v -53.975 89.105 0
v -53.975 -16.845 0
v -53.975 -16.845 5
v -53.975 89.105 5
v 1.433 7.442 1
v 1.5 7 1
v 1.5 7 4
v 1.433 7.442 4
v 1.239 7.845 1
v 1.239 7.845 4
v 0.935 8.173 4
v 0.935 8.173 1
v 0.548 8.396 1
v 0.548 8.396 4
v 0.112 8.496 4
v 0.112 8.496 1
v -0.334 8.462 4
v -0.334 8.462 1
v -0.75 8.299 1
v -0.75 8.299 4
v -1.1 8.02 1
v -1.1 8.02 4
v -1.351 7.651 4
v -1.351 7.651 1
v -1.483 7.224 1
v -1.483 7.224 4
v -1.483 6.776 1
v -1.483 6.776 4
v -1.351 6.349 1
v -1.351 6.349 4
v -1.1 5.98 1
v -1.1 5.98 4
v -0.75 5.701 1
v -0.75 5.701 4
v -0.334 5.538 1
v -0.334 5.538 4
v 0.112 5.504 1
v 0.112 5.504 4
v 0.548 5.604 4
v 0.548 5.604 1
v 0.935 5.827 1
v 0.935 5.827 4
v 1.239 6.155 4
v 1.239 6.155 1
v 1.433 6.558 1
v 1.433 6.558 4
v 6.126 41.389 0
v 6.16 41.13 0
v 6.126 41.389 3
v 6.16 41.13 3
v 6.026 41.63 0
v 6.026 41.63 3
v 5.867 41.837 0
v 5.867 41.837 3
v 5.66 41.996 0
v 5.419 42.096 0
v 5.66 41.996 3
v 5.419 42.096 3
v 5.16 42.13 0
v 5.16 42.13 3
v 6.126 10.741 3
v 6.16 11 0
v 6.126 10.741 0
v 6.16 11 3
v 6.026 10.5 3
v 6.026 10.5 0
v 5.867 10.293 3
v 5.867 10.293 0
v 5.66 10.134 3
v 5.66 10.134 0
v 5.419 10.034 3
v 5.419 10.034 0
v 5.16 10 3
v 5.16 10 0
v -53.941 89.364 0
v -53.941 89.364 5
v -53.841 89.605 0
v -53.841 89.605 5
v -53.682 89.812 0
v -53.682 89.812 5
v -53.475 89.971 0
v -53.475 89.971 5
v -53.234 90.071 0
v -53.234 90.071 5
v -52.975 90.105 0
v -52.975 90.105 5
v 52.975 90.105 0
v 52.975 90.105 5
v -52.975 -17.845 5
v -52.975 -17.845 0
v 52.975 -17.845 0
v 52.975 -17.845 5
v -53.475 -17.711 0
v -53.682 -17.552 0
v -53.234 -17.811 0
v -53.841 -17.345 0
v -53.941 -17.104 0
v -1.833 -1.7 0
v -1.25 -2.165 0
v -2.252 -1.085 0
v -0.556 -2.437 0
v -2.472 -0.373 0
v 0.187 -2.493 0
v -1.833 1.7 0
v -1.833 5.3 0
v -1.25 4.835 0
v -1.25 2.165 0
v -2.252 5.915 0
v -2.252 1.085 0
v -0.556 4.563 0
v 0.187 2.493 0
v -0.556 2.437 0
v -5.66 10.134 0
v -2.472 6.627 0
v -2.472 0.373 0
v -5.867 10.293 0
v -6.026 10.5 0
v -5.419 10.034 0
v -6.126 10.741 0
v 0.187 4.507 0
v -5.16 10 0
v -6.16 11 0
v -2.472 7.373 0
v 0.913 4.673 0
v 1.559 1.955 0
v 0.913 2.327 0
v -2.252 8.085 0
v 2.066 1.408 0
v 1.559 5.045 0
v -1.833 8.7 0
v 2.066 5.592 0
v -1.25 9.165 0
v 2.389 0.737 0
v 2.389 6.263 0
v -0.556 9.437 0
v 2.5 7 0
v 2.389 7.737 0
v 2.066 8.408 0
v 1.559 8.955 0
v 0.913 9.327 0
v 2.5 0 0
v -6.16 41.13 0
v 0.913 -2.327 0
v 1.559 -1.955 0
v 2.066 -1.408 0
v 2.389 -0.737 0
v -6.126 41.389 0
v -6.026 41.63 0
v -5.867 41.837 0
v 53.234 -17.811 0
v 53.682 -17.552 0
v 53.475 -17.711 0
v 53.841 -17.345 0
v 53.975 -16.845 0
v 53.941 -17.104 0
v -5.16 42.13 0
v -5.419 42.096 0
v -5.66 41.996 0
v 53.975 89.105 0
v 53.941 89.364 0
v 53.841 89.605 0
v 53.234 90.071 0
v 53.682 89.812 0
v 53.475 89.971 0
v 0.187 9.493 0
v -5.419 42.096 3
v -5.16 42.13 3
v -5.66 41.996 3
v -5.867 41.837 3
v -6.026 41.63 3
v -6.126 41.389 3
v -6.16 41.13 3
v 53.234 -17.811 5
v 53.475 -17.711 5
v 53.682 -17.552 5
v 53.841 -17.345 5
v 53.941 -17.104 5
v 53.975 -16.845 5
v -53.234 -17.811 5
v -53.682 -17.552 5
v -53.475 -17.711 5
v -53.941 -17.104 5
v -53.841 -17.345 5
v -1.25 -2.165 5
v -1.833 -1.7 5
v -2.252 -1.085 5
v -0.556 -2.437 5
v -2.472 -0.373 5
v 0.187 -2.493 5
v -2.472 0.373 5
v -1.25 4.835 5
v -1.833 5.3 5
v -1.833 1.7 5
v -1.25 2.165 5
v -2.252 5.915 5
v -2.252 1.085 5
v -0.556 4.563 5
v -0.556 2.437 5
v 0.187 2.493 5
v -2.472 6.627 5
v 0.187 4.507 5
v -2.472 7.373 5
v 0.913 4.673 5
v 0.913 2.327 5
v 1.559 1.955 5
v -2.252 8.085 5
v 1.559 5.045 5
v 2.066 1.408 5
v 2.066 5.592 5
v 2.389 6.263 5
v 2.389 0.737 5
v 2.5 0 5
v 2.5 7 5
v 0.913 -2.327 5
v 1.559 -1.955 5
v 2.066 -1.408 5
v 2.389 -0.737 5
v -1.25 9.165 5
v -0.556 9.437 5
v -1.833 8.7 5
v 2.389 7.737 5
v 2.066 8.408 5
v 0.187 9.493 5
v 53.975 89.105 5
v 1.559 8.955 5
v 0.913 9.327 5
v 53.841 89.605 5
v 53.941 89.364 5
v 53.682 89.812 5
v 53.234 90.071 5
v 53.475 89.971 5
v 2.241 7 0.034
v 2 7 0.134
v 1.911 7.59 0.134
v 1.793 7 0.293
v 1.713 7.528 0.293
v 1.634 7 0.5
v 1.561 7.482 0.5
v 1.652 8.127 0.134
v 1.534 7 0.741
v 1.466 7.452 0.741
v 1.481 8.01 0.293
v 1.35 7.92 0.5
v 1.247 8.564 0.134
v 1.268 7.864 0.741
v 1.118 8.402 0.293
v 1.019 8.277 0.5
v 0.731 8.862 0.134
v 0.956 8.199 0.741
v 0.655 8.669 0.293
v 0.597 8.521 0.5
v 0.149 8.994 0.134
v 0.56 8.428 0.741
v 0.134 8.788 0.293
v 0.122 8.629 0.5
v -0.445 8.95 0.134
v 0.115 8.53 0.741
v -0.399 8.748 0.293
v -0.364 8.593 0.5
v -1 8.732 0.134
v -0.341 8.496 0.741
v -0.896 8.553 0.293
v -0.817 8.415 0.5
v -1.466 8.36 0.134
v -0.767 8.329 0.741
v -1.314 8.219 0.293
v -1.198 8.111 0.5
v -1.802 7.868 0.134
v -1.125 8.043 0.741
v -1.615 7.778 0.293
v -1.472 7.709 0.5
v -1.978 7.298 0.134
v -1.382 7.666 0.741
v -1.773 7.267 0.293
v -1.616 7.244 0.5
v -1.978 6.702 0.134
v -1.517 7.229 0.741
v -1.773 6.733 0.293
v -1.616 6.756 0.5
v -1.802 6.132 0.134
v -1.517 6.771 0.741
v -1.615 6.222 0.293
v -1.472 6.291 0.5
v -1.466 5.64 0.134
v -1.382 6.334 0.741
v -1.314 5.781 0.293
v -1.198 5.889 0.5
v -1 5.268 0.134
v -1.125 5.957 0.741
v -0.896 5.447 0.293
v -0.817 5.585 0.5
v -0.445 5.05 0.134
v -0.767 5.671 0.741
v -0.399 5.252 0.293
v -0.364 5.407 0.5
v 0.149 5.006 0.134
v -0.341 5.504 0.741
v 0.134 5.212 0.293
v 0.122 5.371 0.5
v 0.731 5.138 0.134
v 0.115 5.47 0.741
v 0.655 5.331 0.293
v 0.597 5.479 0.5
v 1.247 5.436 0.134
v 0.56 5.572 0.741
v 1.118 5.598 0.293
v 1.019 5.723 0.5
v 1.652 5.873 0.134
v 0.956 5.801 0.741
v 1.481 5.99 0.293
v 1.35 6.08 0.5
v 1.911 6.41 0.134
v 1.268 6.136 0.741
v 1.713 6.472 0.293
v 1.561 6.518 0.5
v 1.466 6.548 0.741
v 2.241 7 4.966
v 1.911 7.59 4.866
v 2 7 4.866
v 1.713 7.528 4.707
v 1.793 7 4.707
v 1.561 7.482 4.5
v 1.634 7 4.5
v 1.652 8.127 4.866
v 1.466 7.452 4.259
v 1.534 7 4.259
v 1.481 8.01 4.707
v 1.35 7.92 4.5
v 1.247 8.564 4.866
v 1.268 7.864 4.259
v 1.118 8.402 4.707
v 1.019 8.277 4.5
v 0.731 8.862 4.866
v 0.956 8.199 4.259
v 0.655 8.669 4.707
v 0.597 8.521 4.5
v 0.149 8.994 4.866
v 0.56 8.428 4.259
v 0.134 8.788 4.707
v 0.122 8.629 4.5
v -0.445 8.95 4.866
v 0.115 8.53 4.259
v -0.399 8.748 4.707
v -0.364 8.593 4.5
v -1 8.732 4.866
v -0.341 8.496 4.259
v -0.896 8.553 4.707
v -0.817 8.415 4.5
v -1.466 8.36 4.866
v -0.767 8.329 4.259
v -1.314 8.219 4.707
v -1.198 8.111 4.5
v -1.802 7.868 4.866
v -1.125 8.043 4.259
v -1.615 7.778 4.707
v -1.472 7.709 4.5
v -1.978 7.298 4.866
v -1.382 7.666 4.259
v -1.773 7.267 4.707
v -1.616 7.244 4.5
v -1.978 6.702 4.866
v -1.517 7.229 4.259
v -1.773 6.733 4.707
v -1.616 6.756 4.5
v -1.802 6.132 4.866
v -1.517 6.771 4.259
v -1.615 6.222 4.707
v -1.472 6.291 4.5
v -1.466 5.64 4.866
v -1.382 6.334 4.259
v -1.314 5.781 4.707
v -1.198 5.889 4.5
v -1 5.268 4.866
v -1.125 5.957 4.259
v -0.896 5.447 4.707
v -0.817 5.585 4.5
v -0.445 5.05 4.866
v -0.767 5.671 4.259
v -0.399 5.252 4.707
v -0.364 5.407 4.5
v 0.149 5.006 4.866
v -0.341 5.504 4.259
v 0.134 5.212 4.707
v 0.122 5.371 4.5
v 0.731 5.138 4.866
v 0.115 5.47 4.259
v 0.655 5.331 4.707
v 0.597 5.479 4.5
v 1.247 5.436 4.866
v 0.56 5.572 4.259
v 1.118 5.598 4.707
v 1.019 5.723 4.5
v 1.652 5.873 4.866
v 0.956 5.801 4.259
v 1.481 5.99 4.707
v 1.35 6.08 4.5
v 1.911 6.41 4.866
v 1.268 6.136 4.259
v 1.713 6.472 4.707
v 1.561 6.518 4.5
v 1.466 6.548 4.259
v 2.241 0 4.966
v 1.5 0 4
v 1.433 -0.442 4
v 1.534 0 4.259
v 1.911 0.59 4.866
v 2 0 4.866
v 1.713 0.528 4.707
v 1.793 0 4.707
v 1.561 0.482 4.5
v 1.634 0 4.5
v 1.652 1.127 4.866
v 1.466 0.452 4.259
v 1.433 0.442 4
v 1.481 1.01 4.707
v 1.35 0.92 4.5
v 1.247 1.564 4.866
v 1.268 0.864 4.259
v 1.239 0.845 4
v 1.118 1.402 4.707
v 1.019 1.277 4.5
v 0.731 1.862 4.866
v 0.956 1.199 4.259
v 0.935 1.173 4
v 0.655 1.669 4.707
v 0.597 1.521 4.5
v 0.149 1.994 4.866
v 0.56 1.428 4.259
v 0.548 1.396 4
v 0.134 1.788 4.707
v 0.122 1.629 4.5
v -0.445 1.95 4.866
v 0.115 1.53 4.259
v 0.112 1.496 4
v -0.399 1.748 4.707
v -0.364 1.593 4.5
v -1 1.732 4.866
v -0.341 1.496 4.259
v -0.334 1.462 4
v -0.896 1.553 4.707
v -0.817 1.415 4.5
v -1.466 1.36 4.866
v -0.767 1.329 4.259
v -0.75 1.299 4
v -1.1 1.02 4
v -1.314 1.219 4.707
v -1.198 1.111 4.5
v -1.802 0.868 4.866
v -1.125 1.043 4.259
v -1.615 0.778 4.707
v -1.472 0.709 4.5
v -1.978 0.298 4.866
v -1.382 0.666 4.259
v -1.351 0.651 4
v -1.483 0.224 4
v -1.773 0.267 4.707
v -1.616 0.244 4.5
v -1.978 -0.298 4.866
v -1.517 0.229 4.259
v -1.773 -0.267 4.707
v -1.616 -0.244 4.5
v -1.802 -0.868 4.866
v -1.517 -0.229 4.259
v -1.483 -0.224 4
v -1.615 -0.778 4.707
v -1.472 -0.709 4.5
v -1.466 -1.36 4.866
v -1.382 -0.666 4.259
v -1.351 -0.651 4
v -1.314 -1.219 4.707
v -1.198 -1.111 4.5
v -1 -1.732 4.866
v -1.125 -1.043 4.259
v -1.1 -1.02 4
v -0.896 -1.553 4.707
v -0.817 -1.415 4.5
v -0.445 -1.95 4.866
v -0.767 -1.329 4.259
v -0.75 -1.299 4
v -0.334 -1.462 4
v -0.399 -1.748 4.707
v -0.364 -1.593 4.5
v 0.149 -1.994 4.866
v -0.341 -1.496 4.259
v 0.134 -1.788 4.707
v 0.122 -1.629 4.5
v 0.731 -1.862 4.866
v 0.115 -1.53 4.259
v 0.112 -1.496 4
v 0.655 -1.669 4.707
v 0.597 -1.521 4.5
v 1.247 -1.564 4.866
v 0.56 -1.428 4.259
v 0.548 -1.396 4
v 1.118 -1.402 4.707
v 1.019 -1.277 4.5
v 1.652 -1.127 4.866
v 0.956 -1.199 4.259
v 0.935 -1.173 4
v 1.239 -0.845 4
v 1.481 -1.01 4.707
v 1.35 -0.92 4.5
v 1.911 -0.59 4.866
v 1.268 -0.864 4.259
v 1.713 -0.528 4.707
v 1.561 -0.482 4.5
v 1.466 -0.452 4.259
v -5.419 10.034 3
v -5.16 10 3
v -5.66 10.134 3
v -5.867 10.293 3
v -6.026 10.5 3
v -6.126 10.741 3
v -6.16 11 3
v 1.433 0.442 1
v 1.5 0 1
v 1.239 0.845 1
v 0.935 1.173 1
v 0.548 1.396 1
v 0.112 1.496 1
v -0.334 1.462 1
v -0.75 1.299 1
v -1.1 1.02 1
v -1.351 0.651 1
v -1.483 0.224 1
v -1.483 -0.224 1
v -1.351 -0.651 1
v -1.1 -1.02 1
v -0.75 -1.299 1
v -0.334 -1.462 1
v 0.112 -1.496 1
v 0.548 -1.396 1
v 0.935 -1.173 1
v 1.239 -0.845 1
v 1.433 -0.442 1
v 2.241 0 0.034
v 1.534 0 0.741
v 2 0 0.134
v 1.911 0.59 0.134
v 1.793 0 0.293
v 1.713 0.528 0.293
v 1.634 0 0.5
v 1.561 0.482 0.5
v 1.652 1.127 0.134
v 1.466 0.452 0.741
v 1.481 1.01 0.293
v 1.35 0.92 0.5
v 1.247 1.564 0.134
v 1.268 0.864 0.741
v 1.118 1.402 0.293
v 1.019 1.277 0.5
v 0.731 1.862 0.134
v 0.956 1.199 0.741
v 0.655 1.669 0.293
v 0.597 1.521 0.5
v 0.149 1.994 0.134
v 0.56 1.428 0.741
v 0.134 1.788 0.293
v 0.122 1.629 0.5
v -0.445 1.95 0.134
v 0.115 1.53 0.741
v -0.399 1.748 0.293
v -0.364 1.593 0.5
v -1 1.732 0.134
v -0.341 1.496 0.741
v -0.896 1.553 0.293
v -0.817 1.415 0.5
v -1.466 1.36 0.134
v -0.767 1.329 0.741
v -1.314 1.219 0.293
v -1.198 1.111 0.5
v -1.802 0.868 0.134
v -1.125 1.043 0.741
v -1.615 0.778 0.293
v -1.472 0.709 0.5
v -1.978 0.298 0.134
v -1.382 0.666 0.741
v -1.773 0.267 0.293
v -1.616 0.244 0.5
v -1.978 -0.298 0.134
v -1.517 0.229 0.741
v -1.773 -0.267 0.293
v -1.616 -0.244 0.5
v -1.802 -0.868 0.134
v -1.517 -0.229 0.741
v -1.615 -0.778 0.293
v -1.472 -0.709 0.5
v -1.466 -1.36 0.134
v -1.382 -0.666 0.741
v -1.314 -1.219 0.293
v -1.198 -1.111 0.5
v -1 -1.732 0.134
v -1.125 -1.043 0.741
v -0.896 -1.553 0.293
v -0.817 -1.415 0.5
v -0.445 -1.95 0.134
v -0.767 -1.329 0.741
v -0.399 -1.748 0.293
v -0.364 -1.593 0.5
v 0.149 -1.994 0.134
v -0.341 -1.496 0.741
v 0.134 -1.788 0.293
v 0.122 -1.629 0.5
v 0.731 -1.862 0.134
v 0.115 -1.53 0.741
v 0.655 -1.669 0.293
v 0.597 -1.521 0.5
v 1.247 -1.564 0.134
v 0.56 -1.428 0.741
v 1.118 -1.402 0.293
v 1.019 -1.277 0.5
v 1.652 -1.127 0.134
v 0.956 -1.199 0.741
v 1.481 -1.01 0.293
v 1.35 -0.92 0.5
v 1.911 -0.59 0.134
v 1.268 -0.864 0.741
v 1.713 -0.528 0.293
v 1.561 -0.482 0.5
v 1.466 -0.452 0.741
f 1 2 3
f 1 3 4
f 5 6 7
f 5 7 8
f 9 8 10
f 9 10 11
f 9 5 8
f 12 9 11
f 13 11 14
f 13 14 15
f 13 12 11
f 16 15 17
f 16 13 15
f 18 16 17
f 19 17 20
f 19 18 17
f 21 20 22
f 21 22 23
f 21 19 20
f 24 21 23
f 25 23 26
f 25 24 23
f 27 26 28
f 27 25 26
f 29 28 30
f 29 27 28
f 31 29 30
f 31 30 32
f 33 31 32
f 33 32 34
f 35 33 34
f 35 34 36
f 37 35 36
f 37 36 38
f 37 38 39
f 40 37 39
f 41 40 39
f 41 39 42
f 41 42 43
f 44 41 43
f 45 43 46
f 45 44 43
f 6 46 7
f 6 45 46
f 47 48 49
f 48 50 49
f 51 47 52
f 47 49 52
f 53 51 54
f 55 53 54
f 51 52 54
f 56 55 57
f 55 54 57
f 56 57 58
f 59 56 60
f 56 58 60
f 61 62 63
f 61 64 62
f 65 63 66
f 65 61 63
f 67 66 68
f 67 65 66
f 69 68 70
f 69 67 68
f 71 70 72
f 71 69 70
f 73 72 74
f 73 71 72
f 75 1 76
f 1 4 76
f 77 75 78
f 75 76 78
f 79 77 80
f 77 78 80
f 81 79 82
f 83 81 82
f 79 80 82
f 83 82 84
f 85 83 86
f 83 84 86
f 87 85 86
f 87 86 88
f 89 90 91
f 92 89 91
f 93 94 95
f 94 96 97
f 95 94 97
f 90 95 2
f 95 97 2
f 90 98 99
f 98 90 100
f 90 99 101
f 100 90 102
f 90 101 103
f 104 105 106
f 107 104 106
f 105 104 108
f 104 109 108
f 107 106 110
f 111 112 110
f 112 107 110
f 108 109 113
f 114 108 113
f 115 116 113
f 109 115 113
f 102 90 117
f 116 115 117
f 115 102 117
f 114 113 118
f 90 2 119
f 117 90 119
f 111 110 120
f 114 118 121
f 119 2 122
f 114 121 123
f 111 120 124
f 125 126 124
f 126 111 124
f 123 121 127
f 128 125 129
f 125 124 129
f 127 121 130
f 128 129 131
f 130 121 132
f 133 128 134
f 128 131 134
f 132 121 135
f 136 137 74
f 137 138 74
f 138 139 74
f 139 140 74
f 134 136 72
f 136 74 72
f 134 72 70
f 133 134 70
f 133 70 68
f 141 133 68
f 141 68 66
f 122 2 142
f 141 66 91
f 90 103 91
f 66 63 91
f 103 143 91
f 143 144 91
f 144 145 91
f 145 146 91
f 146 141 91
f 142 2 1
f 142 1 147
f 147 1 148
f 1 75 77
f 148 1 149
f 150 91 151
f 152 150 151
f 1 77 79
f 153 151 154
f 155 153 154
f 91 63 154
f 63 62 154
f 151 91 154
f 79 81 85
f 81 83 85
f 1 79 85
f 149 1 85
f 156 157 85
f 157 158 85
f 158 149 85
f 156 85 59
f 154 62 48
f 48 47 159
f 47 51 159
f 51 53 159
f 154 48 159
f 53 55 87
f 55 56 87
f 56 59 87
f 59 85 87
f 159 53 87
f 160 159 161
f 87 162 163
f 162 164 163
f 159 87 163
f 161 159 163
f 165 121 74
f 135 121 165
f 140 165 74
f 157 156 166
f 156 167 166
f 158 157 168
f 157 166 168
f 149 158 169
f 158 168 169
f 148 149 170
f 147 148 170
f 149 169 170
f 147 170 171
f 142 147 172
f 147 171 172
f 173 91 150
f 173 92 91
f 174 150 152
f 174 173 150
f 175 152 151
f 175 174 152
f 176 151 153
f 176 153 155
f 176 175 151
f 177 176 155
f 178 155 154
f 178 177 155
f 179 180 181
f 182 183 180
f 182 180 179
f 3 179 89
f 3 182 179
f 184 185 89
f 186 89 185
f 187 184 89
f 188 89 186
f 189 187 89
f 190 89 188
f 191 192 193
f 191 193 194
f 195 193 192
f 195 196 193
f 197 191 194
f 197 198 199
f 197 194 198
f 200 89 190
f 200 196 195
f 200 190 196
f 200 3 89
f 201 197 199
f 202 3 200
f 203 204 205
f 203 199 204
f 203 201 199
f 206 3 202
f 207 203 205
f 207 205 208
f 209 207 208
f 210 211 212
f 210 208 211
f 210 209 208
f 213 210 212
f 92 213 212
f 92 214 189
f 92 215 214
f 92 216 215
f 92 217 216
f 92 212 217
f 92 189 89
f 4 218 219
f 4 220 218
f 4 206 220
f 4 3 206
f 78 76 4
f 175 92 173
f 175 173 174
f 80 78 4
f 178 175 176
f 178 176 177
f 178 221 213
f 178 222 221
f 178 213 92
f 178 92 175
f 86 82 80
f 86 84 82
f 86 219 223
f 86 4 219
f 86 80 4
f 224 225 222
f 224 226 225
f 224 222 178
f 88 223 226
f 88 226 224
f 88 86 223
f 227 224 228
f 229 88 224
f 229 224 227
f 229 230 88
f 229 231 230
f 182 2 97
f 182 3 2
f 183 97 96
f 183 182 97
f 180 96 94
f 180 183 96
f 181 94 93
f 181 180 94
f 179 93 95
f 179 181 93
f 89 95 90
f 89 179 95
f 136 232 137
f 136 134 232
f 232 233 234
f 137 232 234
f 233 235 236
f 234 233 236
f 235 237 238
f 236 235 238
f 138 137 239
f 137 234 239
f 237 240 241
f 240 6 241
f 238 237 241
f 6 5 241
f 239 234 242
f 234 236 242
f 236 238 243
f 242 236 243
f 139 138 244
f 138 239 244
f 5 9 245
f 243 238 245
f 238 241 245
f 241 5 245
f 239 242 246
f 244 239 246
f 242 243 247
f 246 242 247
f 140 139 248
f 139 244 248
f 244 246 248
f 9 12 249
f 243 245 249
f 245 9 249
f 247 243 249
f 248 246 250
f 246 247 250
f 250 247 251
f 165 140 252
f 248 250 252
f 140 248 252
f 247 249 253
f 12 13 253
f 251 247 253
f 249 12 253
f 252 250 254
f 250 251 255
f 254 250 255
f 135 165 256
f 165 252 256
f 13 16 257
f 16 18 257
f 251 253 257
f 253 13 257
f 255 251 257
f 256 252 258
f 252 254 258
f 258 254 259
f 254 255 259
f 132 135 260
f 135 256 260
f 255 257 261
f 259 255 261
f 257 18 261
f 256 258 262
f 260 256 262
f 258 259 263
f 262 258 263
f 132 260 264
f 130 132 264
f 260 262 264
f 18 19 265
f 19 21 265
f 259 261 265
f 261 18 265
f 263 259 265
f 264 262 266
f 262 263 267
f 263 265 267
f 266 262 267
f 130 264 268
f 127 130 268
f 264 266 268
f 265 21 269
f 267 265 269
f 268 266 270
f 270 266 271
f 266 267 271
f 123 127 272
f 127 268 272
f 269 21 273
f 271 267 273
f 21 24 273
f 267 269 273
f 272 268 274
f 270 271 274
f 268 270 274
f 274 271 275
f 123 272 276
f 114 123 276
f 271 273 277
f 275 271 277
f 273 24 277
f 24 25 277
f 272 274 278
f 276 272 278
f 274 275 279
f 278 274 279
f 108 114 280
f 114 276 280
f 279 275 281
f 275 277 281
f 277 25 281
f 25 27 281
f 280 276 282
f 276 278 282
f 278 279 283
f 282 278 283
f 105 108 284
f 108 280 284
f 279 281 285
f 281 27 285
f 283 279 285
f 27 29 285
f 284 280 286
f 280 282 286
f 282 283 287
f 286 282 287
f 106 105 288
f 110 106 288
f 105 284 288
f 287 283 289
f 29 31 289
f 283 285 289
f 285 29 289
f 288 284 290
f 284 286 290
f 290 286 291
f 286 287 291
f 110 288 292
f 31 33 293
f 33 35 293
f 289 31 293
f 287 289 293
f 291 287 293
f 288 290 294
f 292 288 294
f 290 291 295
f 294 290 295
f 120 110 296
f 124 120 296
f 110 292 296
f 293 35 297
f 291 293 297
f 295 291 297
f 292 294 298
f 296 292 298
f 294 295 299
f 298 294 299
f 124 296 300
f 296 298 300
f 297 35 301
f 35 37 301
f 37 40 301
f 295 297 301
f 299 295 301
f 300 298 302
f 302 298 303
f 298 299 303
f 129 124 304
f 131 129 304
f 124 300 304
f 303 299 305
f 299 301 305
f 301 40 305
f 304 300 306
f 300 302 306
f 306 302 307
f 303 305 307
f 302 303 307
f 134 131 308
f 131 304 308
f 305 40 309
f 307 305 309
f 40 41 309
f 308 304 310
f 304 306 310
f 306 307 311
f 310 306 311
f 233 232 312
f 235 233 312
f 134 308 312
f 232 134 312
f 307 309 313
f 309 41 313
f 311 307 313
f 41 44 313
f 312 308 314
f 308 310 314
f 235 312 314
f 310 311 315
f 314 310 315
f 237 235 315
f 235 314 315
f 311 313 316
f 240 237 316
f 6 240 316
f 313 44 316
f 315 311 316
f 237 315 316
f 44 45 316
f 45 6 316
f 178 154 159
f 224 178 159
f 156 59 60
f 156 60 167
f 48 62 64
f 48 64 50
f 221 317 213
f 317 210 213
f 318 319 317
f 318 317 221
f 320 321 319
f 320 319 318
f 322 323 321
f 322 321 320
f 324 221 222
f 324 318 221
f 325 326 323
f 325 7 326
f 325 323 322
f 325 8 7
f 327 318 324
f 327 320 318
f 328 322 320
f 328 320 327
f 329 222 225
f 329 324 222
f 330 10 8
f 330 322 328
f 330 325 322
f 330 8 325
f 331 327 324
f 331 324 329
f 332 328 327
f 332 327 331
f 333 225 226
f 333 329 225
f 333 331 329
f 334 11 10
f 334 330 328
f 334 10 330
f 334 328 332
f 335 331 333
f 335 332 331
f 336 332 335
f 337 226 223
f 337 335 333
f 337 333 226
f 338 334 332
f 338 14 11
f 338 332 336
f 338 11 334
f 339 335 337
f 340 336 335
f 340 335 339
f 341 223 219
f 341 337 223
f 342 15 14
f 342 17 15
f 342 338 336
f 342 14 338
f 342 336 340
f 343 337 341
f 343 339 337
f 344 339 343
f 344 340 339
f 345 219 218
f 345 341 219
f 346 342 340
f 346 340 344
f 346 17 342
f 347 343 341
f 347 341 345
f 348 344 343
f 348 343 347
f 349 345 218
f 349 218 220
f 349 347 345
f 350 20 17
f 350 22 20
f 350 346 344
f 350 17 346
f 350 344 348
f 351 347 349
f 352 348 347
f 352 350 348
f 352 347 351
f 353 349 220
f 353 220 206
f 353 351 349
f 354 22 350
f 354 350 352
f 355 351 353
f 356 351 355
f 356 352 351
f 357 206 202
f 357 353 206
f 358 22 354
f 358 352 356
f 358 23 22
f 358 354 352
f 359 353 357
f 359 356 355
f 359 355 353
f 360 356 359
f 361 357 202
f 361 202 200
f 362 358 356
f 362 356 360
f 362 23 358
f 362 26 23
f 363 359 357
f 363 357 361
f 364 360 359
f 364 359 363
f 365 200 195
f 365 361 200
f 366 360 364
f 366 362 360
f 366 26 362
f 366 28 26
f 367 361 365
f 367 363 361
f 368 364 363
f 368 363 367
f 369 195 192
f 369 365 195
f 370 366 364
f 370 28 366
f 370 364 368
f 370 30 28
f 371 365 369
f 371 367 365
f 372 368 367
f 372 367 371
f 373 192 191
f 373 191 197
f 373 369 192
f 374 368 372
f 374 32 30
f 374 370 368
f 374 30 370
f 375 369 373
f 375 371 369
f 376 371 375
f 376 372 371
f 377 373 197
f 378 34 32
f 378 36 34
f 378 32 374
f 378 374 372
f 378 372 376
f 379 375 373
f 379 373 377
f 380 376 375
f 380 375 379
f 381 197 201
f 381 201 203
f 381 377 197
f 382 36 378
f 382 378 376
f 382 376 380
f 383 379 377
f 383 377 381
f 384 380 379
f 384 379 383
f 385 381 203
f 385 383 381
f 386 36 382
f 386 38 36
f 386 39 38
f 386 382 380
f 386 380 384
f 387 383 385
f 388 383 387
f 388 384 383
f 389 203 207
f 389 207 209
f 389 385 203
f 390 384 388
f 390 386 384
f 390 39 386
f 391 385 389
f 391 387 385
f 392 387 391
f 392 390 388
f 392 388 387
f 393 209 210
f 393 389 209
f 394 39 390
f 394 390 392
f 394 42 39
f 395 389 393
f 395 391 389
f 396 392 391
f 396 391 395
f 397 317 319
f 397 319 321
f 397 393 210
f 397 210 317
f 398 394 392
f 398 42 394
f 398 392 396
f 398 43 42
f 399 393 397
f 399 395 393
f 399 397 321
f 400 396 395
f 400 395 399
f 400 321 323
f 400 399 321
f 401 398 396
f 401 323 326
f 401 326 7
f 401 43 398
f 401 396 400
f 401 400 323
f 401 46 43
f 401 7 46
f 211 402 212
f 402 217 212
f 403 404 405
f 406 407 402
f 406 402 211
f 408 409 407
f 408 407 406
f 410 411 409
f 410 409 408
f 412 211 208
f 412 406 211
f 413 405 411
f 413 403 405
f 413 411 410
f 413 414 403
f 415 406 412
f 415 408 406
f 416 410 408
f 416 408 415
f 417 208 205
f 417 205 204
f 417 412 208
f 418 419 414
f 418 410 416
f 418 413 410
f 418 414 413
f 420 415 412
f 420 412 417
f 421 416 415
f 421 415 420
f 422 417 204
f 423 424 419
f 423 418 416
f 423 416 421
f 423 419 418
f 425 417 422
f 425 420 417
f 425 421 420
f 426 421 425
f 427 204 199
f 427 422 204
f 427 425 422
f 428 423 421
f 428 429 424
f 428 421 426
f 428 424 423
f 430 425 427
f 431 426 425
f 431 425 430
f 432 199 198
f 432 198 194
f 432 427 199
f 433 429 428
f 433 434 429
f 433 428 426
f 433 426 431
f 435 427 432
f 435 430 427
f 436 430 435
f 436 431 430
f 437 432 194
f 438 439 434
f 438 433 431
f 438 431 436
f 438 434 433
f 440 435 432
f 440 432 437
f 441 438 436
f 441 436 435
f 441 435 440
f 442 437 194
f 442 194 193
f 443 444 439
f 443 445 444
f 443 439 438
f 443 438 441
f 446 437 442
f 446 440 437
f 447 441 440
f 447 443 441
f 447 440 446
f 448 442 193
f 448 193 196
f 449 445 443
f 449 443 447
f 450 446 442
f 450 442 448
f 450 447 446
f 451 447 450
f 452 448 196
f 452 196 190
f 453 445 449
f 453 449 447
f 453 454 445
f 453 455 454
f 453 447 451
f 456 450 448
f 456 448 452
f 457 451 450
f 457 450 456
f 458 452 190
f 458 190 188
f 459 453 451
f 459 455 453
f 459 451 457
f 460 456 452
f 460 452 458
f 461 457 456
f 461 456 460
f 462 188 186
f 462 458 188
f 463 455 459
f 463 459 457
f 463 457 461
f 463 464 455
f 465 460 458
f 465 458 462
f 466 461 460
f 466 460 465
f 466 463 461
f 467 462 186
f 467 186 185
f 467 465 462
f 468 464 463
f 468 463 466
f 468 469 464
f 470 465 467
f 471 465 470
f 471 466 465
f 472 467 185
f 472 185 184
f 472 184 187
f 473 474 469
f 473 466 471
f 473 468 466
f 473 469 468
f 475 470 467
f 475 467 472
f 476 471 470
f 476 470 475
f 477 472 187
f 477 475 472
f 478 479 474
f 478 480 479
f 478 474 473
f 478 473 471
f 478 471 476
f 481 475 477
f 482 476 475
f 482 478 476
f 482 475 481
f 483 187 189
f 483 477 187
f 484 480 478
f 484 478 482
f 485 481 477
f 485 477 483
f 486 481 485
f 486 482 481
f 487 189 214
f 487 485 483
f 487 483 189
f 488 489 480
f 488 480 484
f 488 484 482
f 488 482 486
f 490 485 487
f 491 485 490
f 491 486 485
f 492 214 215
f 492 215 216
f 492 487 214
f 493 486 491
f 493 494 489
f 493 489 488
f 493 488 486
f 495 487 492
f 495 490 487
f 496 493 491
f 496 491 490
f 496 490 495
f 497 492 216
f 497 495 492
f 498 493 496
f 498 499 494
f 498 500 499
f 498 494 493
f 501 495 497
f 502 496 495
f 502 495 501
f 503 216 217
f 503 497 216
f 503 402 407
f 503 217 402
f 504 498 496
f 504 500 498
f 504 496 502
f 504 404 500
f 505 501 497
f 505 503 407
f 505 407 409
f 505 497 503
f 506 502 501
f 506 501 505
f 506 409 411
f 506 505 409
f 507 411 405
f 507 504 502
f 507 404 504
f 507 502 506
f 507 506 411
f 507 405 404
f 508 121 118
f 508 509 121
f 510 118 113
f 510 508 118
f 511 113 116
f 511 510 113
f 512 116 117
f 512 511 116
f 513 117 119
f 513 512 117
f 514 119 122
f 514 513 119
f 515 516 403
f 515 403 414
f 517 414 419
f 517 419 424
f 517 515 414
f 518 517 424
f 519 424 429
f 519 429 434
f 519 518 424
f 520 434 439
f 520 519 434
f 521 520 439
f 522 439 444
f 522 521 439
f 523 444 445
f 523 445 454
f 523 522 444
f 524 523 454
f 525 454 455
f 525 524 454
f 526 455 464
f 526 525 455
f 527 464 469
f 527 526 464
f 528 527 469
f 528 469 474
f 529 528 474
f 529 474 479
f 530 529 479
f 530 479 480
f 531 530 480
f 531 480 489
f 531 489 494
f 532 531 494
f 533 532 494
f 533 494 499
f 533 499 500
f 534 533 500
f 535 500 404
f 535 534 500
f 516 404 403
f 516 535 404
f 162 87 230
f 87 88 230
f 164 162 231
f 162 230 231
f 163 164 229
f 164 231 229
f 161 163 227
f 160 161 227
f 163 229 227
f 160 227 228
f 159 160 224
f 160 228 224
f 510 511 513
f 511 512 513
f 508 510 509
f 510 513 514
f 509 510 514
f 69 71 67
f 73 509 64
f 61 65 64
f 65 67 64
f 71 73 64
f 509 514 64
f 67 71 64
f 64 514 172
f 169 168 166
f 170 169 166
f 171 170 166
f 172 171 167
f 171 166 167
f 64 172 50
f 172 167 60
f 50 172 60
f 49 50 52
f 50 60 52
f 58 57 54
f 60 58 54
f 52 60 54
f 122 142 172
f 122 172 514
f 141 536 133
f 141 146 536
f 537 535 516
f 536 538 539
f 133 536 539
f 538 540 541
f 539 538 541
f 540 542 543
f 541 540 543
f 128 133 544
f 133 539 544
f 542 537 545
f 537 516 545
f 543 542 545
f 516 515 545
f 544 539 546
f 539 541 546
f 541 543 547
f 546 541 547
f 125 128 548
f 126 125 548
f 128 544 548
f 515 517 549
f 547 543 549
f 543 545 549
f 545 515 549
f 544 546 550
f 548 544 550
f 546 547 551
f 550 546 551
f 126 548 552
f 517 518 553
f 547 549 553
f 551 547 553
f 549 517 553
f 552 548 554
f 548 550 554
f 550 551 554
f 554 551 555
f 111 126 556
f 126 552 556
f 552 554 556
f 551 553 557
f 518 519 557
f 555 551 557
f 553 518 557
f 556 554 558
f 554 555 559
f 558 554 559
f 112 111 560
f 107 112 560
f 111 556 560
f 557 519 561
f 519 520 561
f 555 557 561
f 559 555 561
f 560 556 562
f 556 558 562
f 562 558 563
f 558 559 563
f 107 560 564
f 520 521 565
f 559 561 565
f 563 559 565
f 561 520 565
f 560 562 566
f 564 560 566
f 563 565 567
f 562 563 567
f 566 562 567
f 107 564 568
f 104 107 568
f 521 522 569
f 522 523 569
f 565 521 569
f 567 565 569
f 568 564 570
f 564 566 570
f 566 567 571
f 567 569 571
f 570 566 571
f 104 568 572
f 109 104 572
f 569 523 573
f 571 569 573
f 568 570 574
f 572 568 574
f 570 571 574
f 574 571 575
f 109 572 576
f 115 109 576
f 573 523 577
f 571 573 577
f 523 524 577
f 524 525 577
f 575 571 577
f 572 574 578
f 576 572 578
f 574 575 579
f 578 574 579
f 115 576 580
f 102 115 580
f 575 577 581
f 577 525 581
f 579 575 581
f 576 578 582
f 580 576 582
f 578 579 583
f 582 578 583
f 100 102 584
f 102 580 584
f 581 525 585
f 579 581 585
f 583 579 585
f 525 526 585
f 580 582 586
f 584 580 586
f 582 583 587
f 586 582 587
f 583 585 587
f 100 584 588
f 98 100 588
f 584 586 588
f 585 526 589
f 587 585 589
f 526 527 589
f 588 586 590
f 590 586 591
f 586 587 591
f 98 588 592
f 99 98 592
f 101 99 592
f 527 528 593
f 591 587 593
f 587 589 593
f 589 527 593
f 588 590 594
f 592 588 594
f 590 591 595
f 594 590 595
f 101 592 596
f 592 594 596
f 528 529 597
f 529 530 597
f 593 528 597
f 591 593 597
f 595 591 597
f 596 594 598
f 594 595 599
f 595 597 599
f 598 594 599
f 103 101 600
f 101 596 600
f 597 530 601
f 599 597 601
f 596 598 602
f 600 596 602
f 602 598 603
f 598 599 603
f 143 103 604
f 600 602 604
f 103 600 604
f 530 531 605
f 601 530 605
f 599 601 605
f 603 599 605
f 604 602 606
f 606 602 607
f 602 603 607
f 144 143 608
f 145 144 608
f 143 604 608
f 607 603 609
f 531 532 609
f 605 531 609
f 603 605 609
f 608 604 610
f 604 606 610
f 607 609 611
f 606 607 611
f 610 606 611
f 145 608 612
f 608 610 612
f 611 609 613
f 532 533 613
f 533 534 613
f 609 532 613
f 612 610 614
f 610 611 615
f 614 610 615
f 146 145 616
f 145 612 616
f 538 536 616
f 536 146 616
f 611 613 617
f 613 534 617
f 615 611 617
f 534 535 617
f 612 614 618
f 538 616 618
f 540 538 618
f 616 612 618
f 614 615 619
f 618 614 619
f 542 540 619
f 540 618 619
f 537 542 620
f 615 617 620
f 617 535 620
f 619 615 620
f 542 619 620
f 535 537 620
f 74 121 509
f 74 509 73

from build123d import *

# Parameters (mm, degrees)
F0_W     = 107.95
F0_H     = 107.95
F0_W_2   = 9.32
F0_H_2   = 14.5
F0_R     = 1.5
F0_H_3   = 30.63
F1_DEPTH = 5
F2_DEPTH = 3
F3_DEPTH = 5
F4_R     = 1


with BuildPart() as f1:
    # F0 (on Top) → F1 (new body)
    with BuildSketch(Plane.XY):
        with Locations((0, 36.13)):
            Rectangle(F0_W, F0_H)
        Polygon((6.16, 42.13), (6.16, 10), (6.16, -6), (0, -6), (-6.16, -6), (-6.16, 10), (-6.16, 42.13), (0, 42.13), align=None, mode=Mode.SUBTRACT)
        Polygon((6.16, 10), (4.66, 10), (4.66, -4.5), (-4.66, -4.5), (-4.66, 10), (-6.16, 10), (-6.16, -6), (0, -6), (6.16, -6), align=None)
        with Locations((0, 2.75)):
            Rectangle(F0_W_2, F0_H_2)
        Circle(F0_R, mode=Mode.SUBTRACT)
        with Locations((0, 7)):
            Circle(F0_R, mode=Mode.SUBTRACT)
        with Locations((0, 25.315)):
            Rectangle(F0_W_2, F0_H_3)
        with Locations((0, 29.13)):
            Circle(F0_R, mode=Mode.SUBTRACT)
        with Locations((0, 36.13)):
            Circle(F0_R, mode=Mode.SUBTRACT)
        Polygon((-4.66, 40.63), (4.66, 40.63), (4.66, 10), (6.16, 10), (6.16, 42.13), (0, 42.13), (-6.16, 42.13), (-6.16, 10), (-4.66, 10), align=None)
        with Locations((0, 29.13)):
            Circle(F0_R)
        with Locations((0, 36.13)):
            Circle(F0_R)
        with Locations((0, 7)):
            Circle(F0_R)
        Circle(F0_R)
    extrude(amount=F1_DEPTH)

    # F0 (on Top) → F2 (cut)
    with BuildSketch(Plane.XY):
        Polygon((-4.66, 40.63), (4.66, 40.63), (4.66, 10), (6.16, 10), (6.16, 42.13), (0, 42.13), (-6.16, 42.13), (-6.16, 10), (-4.66, 10), align=None)
        with Locations((0, 25.315)):
            Rectangle(F0_W_2, F0_H_3)
        with Locations((0, 29.13)):
            Circle(F0_R, mode=Mode.SUBTRACT)
        with Locations((0, 36.13)):
            Circle(F0_R, mode=Mode.SUBTRACT)
        with Locations((0, 29.13)):
            Circle(F0_R)
        with Locations((0, 36.13)):
            Circle(F0_R)
    extrude(amount=F2_DEPTH, mode=Mode.SUBTRACT)

    # F0 (on Top) → F3 (cut, through all)
    with BuildSketch(Plane.XY):
        Circle(F0_R)
        with Locations((0, 7)):
            Circle(F0_R)
    extrude(amount=F3_DEPTH, mode=Mode.SUBTRACT)

    # F4
    f4_edges = [f1.edges().sort_by_distance(p)[0] for p in [
        (6.16, 42.13, 1.5),
        (6.16, 10, 1.5),
        (-53.975, 90.105, 2.5),
        (53.975, 90.105, 2.5),
        (-53.975, -17.845, 2.5),
        (-6.16, 42.13, 1.5),
        (53.975, -17.845, 2.5),
        (-6.16, 10, 1.5),
        (-1.5, 7, 0),
        (-1.5, 0, 0),
        (-1.5, 7, 5),
        (-1.5, 0, 5),
    ]]
    fillet(f4_edges, radius=F4_R)


solid = f1.part
